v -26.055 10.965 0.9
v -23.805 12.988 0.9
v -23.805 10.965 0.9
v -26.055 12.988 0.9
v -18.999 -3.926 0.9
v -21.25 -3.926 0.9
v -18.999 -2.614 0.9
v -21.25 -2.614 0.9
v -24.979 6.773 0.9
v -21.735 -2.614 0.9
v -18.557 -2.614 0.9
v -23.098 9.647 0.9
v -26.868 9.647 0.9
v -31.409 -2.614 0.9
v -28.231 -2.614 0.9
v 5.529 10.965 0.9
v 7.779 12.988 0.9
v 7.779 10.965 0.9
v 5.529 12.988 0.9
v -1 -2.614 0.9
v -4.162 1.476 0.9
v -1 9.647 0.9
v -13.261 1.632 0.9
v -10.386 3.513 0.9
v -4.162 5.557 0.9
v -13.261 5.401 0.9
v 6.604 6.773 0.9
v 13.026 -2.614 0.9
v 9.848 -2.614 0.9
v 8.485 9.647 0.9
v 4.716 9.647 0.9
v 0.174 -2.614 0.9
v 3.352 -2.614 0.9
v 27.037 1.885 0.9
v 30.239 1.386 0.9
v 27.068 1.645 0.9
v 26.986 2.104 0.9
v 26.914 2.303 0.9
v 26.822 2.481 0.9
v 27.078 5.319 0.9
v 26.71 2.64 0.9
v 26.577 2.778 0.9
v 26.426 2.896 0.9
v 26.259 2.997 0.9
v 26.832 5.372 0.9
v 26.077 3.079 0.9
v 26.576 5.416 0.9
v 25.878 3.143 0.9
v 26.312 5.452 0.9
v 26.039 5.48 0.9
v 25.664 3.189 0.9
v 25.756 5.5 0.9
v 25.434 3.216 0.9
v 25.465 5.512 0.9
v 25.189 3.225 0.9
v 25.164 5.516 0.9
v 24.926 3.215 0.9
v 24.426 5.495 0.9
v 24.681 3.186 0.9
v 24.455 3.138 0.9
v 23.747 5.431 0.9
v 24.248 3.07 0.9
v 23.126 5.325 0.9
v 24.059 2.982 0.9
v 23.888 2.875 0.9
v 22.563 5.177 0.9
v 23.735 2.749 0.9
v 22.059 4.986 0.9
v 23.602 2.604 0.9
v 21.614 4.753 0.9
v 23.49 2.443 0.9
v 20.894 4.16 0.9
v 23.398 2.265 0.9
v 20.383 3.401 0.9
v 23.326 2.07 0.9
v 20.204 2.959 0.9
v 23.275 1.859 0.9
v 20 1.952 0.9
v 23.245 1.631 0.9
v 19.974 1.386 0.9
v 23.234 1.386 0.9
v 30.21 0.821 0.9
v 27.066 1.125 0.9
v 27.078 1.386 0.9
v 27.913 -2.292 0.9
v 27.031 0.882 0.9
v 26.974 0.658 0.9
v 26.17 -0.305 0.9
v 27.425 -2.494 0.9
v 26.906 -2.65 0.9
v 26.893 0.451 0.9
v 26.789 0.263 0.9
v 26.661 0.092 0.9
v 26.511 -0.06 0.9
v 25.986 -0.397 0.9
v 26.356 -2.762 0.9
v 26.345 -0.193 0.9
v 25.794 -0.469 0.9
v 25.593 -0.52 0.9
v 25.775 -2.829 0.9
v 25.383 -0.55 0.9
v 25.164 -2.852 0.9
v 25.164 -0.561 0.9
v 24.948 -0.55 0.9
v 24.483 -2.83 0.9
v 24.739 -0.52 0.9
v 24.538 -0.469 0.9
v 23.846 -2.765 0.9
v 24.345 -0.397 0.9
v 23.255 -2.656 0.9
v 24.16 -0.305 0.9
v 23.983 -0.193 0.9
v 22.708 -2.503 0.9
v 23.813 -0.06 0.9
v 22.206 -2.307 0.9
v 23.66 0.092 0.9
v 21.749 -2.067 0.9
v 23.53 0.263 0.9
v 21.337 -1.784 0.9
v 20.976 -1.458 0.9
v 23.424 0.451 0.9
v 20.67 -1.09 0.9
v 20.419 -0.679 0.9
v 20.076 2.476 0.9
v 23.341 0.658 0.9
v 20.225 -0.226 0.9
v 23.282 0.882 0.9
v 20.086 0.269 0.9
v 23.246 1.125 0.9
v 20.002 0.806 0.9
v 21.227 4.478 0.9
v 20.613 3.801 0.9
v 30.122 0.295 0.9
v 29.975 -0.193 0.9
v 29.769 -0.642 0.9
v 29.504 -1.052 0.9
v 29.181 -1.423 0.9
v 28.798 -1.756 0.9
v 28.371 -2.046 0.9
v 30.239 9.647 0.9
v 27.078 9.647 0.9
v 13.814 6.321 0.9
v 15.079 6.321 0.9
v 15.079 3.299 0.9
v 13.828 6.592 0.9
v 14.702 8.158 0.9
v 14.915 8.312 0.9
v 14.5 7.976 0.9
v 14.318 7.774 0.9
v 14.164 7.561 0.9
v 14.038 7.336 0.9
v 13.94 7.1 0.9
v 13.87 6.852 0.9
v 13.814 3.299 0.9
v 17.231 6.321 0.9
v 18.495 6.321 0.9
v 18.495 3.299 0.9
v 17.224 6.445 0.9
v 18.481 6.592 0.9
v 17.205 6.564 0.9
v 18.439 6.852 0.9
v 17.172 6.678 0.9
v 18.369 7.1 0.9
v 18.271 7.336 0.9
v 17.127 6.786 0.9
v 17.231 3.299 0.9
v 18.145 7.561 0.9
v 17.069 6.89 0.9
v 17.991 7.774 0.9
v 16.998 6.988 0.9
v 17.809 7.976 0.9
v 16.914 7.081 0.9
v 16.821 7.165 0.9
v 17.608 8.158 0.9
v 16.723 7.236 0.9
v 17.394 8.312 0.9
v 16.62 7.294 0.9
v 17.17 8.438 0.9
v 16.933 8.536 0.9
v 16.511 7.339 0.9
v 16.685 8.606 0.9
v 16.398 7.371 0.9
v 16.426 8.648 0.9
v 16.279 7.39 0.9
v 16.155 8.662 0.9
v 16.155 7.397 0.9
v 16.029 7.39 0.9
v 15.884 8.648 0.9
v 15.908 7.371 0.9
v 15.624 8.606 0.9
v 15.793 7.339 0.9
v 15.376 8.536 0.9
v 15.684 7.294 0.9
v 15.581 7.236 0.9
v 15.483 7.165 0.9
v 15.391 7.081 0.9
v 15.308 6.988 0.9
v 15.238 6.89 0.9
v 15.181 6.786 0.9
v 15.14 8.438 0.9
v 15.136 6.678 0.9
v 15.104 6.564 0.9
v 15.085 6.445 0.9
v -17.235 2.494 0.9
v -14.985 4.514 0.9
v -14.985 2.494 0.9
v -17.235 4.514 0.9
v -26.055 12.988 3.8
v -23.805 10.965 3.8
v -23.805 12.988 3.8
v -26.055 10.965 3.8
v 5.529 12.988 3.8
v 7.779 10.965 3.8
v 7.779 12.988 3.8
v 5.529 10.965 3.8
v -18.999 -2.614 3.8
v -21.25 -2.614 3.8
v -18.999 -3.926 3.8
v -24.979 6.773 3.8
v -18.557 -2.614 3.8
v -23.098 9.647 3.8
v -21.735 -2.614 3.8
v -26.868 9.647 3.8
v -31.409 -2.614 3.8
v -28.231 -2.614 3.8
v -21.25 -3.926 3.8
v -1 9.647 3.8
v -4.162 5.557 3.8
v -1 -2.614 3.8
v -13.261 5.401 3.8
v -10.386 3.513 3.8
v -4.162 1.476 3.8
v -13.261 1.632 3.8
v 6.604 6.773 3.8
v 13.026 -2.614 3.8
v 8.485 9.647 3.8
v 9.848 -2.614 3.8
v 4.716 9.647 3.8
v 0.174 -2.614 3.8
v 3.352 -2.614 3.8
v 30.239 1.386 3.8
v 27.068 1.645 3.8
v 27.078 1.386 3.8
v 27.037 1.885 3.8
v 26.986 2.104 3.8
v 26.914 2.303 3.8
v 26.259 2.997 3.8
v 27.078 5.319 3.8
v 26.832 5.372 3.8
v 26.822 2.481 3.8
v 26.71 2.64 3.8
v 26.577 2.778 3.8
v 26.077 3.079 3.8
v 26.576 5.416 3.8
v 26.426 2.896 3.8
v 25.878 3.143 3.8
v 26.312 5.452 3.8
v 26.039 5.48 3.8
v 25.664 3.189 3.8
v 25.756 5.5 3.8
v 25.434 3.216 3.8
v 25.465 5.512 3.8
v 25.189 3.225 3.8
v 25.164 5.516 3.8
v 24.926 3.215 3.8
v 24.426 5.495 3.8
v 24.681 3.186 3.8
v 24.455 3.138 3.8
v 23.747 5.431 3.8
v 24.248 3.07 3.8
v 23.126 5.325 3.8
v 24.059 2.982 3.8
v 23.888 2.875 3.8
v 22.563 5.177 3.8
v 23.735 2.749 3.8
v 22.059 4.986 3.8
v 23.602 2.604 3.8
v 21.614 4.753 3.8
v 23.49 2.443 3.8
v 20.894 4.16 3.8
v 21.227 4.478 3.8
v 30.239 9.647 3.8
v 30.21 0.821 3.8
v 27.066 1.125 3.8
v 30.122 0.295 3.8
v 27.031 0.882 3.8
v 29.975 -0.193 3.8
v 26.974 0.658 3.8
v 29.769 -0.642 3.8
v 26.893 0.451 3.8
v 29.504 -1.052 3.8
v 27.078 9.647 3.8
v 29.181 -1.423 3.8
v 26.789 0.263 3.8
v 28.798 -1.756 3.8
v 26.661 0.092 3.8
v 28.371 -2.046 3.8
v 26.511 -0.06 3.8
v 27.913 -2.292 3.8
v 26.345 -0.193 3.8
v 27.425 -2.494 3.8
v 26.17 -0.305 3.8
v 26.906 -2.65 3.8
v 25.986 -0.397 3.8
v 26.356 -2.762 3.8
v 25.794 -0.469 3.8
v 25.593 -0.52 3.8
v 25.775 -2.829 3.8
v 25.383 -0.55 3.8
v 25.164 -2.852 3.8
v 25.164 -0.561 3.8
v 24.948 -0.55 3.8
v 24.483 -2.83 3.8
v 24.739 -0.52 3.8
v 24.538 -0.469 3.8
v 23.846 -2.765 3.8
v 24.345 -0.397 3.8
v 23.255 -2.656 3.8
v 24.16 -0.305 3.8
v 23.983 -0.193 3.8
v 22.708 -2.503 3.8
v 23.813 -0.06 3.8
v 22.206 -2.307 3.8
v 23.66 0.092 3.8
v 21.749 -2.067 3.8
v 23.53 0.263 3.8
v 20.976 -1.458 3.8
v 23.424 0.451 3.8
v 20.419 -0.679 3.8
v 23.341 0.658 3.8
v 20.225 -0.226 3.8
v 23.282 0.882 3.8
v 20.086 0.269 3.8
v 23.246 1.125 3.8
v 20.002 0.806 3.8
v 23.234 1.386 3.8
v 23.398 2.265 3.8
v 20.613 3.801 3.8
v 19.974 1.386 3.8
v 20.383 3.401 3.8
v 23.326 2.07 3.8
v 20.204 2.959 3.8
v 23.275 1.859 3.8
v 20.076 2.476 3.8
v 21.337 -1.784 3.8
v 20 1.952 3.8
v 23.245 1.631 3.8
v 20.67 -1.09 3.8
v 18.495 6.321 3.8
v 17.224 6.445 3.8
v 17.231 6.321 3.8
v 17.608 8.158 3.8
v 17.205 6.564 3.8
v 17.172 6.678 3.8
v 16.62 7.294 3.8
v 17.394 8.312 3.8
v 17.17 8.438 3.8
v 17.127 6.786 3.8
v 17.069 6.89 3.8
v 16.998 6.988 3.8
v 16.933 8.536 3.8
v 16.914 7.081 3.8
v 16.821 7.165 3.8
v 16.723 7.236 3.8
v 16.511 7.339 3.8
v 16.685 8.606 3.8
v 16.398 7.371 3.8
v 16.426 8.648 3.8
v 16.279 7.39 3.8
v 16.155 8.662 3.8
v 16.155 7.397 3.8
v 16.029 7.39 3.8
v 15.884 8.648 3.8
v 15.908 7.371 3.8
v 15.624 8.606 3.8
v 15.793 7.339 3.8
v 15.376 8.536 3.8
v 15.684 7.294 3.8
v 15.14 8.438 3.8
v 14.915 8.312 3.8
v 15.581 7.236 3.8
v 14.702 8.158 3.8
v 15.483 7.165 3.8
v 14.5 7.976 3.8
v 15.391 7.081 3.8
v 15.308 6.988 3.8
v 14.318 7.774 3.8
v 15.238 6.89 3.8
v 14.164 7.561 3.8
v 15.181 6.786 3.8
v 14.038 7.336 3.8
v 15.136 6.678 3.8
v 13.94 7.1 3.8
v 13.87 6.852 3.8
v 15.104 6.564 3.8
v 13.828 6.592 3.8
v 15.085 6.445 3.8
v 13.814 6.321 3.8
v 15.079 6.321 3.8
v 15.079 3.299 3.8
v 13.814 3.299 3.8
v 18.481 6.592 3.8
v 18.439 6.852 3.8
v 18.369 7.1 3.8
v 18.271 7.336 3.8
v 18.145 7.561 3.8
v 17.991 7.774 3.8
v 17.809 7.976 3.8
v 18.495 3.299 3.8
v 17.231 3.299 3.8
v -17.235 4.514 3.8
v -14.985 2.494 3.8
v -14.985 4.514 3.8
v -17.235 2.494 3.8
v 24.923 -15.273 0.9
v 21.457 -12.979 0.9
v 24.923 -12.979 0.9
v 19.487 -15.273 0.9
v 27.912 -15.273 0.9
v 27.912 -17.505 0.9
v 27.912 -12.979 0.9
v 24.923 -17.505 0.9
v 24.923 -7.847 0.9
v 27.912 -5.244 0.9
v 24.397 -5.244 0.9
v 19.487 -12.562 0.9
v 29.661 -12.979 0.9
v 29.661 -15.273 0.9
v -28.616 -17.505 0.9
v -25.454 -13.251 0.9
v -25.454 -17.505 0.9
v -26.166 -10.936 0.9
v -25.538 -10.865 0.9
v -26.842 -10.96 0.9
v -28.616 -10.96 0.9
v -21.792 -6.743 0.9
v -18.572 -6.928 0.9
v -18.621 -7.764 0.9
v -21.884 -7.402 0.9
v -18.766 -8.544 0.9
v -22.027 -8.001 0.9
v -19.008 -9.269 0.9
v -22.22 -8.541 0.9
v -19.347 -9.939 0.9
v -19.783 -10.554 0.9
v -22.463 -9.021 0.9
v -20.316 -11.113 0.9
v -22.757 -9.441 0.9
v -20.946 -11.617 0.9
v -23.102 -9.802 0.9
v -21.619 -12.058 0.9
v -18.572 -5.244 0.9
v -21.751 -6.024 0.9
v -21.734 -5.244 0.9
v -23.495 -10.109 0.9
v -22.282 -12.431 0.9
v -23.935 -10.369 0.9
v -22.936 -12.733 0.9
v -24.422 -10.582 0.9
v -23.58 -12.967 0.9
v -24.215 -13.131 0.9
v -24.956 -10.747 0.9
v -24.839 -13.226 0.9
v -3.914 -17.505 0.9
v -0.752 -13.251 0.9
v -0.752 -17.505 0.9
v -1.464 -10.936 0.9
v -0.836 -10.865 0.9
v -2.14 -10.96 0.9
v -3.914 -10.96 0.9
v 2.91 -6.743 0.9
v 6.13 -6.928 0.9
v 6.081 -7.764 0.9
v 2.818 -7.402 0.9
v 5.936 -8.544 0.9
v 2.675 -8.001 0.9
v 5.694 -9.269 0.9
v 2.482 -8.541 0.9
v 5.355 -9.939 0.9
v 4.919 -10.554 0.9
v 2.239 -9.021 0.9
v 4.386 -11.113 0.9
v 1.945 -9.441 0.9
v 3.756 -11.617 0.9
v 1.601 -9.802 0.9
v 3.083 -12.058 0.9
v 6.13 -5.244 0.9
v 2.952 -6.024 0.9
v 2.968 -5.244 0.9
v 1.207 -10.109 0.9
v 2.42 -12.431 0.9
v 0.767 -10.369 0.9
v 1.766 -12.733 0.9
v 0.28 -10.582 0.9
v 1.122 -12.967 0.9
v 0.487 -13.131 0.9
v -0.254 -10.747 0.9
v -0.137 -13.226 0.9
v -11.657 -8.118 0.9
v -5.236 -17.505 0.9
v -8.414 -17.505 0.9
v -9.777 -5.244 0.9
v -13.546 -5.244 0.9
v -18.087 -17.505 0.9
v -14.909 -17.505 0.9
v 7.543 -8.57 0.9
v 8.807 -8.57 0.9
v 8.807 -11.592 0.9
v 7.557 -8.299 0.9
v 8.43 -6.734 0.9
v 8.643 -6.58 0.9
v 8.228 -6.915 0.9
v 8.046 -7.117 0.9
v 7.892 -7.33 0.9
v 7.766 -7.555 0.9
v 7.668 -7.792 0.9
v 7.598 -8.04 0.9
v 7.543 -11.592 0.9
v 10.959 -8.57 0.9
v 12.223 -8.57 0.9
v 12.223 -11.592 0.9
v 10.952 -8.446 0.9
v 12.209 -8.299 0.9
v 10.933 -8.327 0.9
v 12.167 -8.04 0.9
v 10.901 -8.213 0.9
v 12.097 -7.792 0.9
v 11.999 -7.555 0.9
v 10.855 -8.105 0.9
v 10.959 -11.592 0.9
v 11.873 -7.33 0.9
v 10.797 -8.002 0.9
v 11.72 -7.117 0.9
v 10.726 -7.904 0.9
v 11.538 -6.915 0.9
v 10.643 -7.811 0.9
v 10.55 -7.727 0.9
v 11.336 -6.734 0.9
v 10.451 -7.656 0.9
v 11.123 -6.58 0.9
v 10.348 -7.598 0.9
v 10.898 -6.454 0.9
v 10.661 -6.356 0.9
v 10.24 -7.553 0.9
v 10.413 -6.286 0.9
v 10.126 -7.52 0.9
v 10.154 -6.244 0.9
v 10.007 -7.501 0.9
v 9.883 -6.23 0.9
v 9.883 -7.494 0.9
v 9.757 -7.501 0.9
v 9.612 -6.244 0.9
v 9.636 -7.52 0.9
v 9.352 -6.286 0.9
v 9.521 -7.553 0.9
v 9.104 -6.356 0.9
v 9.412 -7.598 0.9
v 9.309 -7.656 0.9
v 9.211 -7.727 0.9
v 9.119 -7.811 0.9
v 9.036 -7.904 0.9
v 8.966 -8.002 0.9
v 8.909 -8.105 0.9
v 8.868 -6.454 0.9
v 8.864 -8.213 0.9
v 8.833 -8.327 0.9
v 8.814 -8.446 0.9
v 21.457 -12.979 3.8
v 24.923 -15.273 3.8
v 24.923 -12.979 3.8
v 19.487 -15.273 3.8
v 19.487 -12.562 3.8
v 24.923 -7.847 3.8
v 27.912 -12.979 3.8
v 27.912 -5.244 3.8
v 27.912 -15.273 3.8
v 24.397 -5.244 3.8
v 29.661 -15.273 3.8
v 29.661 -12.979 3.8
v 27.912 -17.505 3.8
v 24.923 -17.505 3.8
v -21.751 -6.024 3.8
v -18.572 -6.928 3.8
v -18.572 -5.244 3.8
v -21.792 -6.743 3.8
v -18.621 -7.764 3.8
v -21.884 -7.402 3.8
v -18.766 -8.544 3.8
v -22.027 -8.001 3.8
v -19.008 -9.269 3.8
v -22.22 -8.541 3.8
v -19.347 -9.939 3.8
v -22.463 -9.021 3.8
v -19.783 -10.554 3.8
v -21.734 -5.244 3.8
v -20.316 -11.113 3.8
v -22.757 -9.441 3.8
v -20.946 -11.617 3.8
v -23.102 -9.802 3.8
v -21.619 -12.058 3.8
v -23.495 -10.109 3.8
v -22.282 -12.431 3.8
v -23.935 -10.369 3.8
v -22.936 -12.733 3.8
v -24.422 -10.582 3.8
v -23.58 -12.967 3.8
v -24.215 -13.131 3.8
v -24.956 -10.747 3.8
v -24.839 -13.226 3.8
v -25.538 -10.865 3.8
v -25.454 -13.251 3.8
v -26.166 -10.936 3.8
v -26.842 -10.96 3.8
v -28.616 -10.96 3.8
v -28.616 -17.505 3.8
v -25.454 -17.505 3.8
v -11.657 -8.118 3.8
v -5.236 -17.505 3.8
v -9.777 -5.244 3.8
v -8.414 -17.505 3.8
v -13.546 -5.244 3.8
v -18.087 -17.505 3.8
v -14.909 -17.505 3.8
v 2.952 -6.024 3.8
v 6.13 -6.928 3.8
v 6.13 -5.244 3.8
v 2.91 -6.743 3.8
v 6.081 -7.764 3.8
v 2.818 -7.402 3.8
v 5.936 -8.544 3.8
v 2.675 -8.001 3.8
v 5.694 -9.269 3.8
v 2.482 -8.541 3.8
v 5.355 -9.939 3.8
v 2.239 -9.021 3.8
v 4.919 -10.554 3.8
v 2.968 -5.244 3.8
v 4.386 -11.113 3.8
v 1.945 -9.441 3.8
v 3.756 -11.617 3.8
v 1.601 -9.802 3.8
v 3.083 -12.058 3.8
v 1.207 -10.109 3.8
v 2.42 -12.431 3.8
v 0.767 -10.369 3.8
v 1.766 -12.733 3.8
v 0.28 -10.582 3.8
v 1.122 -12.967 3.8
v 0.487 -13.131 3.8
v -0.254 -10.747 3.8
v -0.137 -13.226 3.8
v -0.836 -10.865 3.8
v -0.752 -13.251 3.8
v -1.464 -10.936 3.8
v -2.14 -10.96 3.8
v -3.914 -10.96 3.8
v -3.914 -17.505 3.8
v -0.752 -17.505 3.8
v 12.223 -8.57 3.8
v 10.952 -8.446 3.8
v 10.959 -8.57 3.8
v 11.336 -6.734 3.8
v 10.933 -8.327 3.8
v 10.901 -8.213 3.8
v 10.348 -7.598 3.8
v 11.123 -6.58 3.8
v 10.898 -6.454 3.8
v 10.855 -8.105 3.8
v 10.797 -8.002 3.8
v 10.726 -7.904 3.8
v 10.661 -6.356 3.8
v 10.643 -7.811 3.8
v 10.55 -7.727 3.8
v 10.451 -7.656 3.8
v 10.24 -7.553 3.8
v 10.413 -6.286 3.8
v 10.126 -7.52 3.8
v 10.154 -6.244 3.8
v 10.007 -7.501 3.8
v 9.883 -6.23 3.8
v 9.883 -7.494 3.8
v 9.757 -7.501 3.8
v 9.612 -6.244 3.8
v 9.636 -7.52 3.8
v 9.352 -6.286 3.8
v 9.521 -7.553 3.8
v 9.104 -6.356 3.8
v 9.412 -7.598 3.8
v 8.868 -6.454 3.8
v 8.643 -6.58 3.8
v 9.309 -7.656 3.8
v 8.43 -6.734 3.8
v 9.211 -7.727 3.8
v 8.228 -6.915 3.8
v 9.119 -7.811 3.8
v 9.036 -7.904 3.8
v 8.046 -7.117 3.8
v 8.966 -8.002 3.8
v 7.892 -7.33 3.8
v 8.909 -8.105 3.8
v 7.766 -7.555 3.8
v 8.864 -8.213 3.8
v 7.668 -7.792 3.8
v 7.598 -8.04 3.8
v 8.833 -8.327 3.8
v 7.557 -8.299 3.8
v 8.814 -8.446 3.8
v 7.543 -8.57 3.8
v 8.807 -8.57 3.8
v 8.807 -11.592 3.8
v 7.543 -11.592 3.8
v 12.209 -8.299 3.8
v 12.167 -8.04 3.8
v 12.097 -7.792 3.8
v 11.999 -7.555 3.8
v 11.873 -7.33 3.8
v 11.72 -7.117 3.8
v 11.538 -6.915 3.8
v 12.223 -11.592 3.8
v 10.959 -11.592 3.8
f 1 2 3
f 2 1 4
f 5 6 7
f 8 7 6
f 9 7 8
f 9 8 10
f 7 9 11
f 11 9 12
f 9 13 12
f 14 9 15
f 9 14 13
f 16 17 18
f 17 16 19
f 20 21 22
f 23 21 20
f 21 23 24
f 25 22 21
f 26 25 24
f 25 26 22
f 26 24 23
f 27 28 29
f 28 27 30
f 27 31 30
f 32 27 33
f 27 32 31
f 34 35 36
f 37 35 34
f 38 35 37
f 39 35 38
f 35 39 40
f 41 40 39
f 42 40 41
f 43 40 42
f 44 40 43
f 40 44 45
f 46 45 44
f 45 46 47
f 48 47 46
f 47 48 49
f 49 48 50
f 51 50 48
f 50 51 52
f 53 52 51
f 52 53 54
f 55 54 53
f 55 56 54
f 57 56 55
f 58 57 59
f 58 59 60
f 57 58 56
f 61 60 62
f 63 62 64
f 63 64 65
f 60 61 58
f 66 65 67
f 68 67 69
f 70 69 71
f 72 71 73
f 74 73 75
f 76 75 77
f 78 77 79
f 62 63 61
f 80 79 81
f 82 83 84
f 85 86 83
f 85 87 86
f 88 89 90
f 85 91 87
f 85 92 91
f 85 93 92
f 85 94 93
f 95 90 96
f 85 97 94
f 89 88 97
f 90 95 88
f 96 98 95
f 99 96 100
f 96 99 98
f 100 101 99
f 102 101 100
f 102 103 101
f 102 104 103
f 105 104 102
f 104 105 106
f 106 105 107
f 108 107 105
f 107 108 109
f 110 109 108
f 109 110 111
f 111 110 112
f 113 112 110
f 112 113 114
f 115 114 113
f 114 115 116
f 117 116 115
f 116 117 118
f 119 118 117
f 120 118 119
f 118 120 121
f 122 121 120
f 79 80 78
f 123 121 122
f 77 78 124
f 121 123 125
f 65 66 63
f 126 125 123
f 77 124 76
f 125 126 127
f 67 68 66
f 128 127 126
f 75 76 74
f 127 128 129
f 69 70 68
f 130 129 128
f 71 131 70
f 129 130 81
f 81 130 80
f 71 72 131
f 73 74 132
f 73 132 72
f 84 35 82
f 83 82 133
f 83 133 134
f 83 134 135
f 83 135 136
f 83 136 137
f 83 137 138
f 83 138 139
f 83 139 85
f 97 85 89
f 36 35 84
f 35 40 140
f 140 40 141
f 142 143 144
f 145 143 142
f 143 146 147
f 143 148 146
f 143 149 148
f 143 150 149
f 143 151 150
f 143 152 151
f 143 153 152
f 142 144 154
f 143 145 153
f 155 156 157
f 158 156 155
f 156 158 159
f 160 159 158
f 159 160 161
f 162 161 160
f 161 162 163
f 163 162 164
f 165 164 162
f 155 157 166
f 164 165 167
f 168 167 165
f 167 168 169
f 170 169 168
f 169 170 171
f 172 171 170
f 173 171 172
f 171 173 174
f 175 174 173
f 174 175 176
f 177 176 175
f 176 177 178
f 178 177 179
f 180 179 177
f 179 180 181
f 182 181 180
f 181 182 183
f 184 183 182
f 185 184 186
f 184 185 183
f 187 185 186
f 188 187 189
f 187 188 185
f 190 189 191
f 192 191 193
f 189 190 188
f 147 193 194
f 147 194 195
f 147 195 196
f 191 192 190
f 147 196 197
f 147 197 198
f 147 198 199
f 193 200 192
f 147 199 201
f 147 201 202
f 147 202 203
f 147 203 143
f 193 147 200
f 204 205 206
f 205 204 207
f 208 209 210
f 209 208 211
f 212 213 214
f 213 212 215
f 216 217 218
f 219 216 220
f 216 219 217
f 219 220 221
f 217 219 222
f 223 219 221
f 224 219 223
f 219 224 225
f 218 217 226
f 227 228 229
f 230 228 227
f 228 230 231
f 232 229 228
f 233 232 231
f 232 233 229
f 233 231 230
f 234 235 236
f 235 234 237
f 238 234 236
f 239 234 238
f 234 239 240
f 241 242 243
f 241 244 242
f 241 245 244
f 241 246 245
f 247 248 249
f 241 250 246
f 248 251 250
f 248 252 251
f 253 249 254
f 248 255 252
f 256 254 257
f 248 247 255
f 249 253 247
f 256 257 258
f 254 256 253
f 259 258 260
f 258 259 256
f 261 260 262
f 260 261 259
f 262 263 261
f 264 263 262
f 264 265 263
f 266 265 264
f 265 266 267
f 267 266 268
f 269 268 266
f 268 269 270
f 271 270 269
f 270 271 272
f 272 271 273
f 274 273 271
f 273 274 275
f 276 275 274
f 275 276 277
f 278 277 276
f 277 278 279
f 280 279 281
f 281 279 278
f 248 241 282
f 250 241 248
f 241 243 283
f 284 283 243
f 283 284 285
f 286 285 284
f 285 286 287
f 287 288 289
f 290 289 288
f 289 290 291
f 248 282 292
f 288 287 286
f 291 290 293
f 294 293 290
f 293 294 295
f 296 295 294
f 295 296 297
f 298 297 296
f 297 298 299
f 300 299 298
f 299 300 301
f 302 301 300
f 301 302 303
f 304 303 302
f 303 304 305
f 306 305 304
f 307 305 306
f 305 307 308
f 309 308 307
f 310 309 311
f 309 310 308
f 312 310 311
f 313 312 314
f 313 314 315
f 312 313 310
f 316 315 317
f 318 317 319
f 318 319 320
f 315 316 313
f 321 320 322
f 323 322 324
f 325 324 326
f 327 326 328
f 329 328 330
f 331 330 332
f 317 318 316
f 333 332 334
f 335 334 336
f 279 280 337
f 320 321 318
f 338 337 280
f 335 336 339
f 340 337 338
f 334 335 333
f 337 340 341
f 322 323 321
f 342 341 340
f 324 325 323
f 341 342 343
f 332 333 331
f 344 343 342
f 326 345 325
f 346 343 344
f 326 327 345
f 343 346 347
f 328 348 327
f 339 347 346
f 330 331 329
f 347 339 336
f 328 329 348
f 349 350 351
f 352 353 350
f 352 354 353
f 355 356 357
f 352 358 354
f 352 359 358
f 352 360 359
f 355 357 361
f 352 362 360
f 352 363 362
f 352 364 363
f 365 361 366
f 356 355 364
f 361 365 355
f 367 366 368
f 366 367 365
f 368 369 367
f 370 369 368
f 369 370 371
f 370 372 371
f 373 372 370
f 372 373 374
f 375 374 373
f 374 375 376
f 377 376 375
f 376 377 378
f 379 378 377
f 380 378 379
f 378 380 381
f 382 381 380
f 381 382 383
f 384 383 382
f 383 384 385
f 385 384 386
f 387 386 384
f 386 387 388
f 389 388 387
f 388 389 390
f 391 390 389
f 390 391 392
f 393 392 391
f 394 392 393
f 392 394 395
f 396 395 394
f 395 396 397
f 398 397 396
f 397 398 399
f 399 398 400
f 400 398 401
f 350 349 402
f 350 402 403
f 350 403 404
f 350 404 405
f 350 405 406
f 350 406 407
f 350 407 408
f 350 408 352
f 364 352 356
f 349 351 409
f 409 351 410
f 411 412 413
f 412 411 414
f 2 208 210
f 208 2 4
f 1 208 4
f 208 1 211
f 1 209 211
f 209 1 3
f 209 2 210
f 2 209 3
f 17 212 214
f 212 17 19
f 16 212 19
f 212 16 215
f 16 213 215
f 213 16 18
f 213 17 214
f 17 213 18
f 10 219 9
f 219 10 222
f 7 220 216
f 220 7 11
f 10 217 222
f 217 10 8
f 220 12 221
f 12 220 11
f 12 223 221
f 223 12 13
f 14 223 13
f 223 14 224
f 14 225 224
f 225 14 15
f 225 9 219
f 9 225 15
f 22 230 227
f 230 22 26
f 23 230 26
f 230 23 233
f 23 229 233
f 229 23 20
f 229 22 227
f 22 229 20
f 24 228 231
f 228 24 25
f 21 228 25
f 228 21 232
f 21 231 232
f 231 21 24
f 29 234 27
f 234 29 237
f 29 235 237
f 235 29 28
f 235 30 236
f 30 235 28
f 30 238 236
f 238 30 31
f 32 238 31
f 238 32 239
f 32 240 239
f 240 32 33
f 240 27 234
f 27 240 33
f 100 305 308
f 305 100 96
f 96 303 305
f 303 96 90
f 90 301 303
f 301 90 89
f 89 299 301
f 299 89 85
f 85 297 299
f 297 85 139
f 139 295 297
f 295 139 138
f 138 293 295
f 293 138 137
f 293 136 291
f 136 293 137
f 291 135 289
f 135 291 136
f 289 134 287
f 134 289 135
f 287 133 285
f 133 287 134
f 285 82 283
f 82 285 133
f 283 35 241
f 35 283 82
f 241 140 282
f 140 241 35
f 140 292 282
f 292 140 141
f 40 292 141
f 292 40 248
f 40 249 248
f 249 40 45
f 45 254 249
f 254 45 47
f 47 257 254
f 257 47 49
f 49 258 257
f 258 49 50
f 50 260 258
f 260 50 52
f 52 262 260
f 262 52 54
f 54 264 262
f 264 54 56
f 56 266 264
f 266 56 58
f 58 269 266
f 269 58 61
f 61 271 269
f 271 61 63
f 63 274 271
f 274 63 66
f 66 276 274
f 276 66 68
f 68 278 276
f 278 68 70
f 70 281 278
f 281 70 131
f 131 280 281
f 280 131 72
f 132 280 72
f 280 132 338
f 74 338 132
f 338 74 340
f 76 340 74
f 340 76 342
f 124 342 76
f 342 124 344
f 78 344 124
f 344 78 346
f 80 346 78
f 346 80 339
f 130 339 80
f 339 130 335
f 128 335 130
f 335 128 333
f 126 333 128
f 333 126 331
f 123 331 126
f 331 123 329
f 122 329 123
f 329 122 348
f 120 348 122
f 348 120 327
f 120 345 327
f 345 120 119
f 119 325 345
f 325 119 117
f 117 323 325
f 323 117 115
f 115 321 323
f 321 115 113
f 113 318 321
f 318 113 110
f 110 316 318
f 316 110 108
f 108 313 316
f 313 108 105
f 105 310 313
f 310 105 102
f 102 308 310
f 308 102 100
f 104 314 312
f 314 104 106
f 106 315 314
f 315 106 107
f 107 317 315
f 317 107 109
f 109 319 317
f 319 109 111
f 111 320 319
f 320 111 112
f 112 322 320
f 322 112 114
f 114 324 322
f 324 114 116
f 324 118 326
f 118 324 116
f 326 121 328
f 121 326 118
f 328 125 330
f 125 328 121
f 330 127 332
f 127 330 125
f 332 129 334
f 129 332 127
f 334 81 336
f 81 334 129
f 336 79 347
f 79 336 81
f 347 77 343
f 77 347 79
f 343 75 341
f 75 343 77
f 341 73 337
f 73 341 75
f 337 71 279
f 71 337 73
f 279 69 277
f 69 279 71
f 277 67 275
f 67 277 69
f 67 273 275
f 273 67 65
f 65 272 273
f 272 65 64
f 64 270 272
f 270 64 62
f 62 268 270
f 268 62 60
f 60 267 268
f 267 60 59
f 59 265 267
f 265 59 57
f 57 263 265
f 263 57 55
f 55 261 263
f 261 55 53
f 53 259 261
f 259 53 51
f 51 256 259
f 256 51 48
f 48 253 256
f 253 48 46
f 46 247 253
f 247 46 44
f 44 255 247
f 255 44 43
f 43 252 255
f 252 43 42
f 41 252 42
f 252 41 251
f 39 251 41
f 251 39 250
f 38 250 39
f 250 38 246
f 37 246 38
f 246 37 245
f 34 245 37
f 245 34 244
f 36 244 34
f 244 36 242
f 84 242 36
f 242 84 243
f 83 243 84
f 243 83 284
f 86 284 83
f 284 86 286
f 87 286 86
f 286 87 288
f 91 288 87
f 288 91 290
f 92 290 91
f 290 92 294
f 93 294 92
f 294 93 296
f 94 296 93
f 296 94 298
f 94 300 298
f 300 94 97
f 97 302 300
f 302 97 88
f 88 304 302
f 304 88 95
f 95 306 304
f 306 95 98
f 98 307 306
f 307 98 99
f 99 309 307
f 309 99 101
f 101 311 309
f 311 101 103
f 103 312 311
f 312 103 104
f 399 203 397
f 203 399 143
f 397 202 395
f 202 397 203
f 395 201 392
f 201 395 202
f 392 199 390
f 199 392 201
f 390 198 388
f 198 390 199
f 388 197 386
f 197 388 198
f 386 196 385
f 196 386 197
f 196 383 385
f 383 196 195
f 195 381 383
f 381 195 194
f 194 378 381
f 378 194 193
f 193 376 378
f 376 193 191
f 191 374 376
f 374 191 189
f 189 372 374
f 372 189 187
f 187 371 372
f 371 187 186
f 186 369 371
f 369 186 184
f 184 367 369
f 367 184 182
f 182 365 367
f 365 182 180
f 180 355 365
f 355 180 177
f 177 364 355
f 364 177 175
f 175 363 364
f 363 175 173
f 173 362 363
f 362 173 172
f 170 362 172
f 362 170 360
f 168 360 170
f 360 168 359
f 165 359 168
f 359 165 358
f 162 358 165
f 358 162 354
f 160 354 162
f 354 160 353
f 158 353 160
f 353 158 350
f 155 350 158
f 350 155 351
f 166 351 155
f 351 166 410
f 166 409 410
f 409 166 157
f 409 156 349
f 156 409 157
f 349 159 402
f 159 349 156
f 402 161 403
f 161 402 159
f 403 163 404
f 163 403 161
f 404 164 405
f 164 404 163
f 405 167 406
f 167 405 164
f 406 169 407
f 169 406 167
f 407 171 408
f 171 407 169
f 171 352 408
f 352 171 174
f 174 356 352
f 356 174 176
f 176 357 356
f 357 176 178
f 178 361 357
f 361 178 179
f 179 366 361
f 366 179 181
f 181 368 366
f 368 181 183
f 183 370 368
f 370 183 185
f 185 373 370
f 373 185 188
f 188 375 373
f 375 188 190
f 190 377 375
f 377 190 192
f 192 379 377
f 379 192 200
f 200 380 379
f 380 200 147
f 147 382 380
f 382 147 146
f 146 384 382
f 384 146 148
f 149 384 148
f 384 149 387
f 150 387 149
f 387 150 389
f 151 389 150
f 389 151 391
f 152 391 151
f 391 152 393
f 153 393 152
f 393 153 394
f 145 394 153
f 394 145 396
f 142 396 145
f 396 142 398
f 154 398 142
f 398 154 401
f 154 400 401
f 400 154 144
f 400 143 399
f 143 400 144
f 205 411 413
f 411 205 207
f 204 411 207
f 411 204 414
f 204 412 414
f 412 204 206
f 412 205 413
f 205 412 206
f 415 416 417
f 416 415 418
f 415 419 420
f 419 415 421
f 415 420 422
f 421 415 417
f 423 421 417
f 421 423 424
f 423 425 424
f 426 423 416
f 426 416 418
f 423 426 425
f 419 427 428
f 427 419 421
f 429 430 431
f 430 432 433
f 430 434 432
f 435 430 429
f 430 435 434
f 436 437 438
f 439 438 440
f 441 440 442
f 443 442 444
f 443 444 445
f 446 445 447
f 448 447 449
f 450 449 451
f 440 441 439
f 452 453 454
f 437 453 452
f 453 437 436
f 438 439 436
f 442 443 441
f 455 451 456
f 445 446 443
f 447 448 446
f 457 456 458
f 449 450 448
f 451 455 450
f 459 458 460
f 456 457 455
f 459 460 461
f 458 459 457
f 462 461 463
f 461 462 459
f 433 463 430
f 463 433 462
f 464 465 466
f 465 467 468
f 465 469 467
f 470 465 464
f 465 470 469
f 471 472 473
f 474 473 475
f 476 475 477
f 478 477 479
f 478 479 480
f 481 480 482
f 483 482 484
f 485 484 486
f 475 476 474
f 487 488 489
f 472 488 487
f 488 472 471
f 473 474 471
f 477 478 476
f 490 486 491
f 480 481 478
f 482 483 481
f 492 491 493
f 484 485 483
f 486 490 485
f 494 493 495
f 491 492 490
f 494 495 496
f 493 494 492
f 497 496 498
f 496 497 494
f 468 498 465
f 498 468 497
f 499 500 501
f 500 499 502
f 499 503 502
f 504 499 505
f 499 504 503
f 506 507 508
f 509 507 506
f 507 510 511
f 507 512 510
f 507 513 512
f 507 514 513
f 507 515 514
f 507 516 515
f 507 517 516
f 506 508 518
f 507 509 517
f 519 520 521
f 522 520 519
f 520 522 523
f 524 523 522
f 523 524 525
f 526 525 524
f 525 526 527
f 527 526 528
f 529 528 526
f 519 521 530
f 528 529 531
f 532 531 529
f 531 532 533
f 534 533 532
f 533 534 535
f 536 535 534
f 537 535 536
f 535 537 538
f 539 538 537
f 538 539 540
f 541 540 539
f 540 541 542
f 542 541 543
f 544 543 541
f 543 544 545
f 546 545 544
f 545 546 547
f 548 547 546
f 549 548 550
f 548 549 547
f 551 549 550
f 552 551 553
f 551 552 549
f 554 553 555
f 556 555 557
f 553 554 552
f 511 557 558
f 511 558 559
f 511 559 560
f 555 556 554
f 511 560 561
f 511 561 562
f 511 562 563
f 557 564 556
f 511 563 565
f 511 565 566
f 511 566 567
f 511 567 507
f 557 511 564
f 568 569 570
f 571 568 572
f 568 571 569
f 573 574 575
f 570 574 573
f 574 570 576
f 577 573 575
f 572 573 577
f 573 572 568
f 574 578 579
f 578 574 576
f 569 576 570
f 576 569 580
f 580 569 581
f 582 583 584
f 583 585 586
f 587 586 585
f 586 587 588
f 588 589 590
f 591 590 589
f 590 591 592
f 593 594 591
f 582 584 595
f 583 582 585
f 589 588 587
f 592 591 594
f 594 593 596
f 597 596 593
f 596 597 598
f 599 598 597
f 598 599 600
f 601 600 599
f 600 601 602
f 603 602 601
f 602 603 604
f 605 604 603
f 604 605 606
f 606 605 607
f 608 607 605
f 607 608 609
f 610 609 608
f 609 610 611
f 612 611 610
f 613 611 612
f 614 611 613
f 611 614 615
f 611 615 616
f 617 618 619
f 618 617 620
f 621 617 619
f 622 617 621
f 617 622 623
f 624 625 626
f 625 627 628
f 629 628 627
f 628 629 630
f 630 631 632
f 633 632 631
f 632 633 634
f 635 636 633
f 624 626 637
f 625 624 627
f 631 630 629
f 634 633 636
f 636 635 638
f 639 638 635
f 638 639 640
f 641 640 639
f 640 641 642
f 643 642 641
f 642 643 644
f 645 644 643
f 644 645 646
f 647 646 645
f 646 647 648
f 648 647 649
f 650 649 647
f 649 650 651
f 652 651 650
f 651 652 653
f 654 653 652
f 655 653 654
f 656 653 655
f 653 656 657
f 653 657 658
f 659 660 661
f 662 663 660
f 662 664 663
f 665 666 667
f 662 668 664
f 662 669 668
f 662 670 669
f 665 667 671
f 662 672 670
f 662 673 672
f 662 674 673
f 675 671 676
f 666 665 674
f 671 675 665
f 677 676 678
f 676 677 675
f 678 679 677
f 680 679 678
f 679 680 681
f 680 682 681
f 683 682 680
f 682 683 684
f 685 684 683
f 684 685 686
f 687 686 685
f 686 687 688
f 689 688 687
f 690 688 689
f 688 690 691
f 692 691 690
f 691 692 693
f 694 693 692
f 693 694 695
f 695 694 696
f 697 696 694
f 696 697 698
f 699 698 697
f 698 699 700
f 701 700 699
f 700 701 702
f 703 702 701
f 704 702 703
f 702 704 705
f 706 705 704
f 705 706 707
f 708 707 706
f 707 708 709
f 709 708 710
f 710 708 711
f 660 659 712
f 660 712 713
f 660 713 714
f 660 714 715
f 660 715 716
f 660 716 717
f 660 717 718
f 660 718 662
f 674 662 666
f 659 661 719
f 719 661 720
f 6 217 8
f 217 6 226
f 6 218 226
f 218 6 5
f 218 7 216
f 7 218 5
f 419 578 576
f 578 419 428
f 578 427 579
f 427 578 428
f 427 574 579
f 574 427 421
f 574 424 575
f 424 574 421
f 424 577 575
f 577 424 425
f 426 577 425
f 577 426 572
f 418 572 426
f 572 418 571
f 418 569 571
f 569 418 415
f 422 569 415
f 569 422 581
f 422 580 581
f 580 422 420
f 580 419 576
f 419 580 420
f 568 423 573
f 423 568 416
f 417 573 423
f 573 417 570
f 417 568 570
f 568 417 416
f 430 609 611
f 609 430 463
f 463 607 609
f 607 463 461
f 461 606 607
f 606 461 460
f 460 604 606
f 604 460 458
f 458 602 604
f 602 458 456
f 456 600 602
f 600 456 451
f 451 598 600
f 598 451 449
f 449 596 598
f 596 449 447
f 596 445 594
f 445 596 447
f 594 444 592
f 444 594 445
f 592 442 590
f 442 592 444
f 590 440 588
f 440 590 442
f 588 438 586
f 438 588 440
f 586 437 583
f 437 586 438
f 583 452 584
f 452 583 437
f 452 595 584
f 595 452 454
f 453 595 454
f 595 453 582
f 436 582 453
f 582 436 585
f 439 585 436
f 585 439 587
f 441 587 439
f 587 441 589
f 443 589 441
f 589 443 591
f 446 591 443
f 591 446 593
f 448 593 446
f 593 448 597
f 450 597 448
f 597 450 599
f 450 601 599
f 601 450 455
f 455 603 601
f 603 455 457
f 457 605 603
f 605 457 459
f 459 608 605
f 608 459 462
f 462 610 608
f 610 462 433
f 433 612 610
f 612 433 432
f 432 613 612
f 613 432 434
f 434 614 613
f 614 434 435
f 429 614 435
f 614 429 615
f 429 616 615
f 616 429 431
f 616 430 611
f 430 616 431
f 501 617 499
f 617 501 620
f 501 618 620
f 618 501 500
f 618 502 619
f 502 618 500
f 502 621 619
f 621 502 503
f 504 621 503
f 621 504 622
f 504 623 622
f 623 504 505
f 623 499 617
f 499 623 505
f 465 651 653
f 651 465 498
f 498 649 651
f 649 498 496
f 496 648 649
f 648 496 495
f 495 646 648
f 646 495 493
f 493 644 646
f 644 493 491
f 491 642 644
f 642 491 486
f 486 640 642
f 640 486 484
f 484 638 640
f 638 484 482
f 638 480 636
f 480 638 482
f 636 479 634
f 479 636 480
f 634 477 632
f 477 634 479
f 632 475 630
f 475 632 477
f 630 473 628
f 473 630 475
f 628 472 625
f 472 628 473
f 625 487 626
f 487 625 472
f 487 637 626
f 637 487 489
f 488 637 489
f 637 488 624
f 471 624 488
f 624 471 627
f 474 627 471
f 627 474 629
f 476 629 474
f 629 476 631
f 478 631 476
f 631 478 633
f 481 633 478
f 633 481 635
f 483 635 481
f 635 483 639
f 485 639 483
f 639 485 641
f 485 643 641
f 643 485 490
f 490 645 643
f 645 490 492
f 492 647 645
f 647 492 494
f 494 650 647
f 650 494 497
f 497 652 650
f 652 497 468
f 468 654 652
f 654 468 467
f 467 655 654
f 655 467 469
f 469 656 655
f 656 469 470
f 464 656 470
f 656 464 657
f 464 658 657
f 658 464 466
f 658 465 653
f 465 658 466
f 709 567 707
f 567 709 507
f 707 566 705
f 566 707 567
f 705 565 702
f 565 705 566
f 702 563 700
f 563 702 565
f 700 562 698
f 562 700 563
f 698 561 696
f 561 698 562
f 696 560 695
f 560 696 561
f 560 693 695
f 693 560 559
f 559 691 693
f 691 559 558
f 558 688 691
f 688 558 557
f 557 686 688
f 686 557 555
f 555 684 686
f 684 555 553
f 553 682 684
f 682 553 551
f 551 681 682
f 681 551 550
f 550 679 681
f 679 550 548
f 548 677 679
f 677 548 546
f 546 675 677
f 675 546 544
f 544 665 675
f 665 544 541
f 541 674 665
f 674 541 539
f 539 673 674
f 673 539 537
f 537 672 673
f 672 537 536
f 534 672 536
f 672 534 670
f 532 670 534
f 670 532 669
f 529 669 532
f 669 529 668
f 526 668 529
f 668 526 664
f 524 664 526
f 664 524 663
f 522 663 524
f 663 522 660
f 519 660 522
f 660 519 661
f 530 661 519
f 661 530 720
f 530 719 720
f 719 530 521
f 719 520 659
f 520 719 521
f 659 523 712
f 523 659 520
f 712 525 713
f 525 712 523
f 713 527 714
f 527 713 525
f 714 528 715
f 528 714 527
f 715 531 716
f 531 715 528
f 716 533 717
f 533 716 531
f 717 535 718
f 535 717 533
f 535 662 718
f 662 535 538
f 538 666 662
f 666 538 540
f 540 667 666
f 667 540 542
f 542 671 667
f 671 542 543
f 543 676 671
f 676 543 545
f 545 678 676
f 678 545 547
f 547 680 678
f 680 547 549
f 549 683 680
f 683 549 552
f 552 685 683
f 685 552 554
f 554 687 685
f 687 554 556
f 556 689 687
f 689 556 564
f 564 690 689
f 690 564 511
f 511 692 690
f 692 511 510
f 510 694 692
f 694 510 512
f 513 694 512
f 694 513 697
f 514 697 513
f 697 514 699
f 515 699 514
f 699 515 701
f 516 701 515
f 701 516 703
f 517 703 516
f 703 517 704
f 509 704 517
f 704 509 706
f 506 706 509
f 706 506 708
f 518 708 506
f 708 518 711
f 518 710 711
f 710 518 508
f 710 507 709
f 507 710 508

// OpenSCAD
$fn = 48;
  // syllabics (overlaid on icon, tallest)
  translate([0, 4.887, 0.900]) linear_extrude(height=2.900) text("ᐲᐗᐲᐢᑯ", size=12.110, halign="center", valign="center", font="Euphemia UCAS:style=Bold");
  translate([0, -9.887, 0.900]) linear_extrude(height=2.900) text("ᓰᐱᓯᐢ 4", size=12.110, halign="center", valign="center", font="Euphemia UCAS:style=Bold");
